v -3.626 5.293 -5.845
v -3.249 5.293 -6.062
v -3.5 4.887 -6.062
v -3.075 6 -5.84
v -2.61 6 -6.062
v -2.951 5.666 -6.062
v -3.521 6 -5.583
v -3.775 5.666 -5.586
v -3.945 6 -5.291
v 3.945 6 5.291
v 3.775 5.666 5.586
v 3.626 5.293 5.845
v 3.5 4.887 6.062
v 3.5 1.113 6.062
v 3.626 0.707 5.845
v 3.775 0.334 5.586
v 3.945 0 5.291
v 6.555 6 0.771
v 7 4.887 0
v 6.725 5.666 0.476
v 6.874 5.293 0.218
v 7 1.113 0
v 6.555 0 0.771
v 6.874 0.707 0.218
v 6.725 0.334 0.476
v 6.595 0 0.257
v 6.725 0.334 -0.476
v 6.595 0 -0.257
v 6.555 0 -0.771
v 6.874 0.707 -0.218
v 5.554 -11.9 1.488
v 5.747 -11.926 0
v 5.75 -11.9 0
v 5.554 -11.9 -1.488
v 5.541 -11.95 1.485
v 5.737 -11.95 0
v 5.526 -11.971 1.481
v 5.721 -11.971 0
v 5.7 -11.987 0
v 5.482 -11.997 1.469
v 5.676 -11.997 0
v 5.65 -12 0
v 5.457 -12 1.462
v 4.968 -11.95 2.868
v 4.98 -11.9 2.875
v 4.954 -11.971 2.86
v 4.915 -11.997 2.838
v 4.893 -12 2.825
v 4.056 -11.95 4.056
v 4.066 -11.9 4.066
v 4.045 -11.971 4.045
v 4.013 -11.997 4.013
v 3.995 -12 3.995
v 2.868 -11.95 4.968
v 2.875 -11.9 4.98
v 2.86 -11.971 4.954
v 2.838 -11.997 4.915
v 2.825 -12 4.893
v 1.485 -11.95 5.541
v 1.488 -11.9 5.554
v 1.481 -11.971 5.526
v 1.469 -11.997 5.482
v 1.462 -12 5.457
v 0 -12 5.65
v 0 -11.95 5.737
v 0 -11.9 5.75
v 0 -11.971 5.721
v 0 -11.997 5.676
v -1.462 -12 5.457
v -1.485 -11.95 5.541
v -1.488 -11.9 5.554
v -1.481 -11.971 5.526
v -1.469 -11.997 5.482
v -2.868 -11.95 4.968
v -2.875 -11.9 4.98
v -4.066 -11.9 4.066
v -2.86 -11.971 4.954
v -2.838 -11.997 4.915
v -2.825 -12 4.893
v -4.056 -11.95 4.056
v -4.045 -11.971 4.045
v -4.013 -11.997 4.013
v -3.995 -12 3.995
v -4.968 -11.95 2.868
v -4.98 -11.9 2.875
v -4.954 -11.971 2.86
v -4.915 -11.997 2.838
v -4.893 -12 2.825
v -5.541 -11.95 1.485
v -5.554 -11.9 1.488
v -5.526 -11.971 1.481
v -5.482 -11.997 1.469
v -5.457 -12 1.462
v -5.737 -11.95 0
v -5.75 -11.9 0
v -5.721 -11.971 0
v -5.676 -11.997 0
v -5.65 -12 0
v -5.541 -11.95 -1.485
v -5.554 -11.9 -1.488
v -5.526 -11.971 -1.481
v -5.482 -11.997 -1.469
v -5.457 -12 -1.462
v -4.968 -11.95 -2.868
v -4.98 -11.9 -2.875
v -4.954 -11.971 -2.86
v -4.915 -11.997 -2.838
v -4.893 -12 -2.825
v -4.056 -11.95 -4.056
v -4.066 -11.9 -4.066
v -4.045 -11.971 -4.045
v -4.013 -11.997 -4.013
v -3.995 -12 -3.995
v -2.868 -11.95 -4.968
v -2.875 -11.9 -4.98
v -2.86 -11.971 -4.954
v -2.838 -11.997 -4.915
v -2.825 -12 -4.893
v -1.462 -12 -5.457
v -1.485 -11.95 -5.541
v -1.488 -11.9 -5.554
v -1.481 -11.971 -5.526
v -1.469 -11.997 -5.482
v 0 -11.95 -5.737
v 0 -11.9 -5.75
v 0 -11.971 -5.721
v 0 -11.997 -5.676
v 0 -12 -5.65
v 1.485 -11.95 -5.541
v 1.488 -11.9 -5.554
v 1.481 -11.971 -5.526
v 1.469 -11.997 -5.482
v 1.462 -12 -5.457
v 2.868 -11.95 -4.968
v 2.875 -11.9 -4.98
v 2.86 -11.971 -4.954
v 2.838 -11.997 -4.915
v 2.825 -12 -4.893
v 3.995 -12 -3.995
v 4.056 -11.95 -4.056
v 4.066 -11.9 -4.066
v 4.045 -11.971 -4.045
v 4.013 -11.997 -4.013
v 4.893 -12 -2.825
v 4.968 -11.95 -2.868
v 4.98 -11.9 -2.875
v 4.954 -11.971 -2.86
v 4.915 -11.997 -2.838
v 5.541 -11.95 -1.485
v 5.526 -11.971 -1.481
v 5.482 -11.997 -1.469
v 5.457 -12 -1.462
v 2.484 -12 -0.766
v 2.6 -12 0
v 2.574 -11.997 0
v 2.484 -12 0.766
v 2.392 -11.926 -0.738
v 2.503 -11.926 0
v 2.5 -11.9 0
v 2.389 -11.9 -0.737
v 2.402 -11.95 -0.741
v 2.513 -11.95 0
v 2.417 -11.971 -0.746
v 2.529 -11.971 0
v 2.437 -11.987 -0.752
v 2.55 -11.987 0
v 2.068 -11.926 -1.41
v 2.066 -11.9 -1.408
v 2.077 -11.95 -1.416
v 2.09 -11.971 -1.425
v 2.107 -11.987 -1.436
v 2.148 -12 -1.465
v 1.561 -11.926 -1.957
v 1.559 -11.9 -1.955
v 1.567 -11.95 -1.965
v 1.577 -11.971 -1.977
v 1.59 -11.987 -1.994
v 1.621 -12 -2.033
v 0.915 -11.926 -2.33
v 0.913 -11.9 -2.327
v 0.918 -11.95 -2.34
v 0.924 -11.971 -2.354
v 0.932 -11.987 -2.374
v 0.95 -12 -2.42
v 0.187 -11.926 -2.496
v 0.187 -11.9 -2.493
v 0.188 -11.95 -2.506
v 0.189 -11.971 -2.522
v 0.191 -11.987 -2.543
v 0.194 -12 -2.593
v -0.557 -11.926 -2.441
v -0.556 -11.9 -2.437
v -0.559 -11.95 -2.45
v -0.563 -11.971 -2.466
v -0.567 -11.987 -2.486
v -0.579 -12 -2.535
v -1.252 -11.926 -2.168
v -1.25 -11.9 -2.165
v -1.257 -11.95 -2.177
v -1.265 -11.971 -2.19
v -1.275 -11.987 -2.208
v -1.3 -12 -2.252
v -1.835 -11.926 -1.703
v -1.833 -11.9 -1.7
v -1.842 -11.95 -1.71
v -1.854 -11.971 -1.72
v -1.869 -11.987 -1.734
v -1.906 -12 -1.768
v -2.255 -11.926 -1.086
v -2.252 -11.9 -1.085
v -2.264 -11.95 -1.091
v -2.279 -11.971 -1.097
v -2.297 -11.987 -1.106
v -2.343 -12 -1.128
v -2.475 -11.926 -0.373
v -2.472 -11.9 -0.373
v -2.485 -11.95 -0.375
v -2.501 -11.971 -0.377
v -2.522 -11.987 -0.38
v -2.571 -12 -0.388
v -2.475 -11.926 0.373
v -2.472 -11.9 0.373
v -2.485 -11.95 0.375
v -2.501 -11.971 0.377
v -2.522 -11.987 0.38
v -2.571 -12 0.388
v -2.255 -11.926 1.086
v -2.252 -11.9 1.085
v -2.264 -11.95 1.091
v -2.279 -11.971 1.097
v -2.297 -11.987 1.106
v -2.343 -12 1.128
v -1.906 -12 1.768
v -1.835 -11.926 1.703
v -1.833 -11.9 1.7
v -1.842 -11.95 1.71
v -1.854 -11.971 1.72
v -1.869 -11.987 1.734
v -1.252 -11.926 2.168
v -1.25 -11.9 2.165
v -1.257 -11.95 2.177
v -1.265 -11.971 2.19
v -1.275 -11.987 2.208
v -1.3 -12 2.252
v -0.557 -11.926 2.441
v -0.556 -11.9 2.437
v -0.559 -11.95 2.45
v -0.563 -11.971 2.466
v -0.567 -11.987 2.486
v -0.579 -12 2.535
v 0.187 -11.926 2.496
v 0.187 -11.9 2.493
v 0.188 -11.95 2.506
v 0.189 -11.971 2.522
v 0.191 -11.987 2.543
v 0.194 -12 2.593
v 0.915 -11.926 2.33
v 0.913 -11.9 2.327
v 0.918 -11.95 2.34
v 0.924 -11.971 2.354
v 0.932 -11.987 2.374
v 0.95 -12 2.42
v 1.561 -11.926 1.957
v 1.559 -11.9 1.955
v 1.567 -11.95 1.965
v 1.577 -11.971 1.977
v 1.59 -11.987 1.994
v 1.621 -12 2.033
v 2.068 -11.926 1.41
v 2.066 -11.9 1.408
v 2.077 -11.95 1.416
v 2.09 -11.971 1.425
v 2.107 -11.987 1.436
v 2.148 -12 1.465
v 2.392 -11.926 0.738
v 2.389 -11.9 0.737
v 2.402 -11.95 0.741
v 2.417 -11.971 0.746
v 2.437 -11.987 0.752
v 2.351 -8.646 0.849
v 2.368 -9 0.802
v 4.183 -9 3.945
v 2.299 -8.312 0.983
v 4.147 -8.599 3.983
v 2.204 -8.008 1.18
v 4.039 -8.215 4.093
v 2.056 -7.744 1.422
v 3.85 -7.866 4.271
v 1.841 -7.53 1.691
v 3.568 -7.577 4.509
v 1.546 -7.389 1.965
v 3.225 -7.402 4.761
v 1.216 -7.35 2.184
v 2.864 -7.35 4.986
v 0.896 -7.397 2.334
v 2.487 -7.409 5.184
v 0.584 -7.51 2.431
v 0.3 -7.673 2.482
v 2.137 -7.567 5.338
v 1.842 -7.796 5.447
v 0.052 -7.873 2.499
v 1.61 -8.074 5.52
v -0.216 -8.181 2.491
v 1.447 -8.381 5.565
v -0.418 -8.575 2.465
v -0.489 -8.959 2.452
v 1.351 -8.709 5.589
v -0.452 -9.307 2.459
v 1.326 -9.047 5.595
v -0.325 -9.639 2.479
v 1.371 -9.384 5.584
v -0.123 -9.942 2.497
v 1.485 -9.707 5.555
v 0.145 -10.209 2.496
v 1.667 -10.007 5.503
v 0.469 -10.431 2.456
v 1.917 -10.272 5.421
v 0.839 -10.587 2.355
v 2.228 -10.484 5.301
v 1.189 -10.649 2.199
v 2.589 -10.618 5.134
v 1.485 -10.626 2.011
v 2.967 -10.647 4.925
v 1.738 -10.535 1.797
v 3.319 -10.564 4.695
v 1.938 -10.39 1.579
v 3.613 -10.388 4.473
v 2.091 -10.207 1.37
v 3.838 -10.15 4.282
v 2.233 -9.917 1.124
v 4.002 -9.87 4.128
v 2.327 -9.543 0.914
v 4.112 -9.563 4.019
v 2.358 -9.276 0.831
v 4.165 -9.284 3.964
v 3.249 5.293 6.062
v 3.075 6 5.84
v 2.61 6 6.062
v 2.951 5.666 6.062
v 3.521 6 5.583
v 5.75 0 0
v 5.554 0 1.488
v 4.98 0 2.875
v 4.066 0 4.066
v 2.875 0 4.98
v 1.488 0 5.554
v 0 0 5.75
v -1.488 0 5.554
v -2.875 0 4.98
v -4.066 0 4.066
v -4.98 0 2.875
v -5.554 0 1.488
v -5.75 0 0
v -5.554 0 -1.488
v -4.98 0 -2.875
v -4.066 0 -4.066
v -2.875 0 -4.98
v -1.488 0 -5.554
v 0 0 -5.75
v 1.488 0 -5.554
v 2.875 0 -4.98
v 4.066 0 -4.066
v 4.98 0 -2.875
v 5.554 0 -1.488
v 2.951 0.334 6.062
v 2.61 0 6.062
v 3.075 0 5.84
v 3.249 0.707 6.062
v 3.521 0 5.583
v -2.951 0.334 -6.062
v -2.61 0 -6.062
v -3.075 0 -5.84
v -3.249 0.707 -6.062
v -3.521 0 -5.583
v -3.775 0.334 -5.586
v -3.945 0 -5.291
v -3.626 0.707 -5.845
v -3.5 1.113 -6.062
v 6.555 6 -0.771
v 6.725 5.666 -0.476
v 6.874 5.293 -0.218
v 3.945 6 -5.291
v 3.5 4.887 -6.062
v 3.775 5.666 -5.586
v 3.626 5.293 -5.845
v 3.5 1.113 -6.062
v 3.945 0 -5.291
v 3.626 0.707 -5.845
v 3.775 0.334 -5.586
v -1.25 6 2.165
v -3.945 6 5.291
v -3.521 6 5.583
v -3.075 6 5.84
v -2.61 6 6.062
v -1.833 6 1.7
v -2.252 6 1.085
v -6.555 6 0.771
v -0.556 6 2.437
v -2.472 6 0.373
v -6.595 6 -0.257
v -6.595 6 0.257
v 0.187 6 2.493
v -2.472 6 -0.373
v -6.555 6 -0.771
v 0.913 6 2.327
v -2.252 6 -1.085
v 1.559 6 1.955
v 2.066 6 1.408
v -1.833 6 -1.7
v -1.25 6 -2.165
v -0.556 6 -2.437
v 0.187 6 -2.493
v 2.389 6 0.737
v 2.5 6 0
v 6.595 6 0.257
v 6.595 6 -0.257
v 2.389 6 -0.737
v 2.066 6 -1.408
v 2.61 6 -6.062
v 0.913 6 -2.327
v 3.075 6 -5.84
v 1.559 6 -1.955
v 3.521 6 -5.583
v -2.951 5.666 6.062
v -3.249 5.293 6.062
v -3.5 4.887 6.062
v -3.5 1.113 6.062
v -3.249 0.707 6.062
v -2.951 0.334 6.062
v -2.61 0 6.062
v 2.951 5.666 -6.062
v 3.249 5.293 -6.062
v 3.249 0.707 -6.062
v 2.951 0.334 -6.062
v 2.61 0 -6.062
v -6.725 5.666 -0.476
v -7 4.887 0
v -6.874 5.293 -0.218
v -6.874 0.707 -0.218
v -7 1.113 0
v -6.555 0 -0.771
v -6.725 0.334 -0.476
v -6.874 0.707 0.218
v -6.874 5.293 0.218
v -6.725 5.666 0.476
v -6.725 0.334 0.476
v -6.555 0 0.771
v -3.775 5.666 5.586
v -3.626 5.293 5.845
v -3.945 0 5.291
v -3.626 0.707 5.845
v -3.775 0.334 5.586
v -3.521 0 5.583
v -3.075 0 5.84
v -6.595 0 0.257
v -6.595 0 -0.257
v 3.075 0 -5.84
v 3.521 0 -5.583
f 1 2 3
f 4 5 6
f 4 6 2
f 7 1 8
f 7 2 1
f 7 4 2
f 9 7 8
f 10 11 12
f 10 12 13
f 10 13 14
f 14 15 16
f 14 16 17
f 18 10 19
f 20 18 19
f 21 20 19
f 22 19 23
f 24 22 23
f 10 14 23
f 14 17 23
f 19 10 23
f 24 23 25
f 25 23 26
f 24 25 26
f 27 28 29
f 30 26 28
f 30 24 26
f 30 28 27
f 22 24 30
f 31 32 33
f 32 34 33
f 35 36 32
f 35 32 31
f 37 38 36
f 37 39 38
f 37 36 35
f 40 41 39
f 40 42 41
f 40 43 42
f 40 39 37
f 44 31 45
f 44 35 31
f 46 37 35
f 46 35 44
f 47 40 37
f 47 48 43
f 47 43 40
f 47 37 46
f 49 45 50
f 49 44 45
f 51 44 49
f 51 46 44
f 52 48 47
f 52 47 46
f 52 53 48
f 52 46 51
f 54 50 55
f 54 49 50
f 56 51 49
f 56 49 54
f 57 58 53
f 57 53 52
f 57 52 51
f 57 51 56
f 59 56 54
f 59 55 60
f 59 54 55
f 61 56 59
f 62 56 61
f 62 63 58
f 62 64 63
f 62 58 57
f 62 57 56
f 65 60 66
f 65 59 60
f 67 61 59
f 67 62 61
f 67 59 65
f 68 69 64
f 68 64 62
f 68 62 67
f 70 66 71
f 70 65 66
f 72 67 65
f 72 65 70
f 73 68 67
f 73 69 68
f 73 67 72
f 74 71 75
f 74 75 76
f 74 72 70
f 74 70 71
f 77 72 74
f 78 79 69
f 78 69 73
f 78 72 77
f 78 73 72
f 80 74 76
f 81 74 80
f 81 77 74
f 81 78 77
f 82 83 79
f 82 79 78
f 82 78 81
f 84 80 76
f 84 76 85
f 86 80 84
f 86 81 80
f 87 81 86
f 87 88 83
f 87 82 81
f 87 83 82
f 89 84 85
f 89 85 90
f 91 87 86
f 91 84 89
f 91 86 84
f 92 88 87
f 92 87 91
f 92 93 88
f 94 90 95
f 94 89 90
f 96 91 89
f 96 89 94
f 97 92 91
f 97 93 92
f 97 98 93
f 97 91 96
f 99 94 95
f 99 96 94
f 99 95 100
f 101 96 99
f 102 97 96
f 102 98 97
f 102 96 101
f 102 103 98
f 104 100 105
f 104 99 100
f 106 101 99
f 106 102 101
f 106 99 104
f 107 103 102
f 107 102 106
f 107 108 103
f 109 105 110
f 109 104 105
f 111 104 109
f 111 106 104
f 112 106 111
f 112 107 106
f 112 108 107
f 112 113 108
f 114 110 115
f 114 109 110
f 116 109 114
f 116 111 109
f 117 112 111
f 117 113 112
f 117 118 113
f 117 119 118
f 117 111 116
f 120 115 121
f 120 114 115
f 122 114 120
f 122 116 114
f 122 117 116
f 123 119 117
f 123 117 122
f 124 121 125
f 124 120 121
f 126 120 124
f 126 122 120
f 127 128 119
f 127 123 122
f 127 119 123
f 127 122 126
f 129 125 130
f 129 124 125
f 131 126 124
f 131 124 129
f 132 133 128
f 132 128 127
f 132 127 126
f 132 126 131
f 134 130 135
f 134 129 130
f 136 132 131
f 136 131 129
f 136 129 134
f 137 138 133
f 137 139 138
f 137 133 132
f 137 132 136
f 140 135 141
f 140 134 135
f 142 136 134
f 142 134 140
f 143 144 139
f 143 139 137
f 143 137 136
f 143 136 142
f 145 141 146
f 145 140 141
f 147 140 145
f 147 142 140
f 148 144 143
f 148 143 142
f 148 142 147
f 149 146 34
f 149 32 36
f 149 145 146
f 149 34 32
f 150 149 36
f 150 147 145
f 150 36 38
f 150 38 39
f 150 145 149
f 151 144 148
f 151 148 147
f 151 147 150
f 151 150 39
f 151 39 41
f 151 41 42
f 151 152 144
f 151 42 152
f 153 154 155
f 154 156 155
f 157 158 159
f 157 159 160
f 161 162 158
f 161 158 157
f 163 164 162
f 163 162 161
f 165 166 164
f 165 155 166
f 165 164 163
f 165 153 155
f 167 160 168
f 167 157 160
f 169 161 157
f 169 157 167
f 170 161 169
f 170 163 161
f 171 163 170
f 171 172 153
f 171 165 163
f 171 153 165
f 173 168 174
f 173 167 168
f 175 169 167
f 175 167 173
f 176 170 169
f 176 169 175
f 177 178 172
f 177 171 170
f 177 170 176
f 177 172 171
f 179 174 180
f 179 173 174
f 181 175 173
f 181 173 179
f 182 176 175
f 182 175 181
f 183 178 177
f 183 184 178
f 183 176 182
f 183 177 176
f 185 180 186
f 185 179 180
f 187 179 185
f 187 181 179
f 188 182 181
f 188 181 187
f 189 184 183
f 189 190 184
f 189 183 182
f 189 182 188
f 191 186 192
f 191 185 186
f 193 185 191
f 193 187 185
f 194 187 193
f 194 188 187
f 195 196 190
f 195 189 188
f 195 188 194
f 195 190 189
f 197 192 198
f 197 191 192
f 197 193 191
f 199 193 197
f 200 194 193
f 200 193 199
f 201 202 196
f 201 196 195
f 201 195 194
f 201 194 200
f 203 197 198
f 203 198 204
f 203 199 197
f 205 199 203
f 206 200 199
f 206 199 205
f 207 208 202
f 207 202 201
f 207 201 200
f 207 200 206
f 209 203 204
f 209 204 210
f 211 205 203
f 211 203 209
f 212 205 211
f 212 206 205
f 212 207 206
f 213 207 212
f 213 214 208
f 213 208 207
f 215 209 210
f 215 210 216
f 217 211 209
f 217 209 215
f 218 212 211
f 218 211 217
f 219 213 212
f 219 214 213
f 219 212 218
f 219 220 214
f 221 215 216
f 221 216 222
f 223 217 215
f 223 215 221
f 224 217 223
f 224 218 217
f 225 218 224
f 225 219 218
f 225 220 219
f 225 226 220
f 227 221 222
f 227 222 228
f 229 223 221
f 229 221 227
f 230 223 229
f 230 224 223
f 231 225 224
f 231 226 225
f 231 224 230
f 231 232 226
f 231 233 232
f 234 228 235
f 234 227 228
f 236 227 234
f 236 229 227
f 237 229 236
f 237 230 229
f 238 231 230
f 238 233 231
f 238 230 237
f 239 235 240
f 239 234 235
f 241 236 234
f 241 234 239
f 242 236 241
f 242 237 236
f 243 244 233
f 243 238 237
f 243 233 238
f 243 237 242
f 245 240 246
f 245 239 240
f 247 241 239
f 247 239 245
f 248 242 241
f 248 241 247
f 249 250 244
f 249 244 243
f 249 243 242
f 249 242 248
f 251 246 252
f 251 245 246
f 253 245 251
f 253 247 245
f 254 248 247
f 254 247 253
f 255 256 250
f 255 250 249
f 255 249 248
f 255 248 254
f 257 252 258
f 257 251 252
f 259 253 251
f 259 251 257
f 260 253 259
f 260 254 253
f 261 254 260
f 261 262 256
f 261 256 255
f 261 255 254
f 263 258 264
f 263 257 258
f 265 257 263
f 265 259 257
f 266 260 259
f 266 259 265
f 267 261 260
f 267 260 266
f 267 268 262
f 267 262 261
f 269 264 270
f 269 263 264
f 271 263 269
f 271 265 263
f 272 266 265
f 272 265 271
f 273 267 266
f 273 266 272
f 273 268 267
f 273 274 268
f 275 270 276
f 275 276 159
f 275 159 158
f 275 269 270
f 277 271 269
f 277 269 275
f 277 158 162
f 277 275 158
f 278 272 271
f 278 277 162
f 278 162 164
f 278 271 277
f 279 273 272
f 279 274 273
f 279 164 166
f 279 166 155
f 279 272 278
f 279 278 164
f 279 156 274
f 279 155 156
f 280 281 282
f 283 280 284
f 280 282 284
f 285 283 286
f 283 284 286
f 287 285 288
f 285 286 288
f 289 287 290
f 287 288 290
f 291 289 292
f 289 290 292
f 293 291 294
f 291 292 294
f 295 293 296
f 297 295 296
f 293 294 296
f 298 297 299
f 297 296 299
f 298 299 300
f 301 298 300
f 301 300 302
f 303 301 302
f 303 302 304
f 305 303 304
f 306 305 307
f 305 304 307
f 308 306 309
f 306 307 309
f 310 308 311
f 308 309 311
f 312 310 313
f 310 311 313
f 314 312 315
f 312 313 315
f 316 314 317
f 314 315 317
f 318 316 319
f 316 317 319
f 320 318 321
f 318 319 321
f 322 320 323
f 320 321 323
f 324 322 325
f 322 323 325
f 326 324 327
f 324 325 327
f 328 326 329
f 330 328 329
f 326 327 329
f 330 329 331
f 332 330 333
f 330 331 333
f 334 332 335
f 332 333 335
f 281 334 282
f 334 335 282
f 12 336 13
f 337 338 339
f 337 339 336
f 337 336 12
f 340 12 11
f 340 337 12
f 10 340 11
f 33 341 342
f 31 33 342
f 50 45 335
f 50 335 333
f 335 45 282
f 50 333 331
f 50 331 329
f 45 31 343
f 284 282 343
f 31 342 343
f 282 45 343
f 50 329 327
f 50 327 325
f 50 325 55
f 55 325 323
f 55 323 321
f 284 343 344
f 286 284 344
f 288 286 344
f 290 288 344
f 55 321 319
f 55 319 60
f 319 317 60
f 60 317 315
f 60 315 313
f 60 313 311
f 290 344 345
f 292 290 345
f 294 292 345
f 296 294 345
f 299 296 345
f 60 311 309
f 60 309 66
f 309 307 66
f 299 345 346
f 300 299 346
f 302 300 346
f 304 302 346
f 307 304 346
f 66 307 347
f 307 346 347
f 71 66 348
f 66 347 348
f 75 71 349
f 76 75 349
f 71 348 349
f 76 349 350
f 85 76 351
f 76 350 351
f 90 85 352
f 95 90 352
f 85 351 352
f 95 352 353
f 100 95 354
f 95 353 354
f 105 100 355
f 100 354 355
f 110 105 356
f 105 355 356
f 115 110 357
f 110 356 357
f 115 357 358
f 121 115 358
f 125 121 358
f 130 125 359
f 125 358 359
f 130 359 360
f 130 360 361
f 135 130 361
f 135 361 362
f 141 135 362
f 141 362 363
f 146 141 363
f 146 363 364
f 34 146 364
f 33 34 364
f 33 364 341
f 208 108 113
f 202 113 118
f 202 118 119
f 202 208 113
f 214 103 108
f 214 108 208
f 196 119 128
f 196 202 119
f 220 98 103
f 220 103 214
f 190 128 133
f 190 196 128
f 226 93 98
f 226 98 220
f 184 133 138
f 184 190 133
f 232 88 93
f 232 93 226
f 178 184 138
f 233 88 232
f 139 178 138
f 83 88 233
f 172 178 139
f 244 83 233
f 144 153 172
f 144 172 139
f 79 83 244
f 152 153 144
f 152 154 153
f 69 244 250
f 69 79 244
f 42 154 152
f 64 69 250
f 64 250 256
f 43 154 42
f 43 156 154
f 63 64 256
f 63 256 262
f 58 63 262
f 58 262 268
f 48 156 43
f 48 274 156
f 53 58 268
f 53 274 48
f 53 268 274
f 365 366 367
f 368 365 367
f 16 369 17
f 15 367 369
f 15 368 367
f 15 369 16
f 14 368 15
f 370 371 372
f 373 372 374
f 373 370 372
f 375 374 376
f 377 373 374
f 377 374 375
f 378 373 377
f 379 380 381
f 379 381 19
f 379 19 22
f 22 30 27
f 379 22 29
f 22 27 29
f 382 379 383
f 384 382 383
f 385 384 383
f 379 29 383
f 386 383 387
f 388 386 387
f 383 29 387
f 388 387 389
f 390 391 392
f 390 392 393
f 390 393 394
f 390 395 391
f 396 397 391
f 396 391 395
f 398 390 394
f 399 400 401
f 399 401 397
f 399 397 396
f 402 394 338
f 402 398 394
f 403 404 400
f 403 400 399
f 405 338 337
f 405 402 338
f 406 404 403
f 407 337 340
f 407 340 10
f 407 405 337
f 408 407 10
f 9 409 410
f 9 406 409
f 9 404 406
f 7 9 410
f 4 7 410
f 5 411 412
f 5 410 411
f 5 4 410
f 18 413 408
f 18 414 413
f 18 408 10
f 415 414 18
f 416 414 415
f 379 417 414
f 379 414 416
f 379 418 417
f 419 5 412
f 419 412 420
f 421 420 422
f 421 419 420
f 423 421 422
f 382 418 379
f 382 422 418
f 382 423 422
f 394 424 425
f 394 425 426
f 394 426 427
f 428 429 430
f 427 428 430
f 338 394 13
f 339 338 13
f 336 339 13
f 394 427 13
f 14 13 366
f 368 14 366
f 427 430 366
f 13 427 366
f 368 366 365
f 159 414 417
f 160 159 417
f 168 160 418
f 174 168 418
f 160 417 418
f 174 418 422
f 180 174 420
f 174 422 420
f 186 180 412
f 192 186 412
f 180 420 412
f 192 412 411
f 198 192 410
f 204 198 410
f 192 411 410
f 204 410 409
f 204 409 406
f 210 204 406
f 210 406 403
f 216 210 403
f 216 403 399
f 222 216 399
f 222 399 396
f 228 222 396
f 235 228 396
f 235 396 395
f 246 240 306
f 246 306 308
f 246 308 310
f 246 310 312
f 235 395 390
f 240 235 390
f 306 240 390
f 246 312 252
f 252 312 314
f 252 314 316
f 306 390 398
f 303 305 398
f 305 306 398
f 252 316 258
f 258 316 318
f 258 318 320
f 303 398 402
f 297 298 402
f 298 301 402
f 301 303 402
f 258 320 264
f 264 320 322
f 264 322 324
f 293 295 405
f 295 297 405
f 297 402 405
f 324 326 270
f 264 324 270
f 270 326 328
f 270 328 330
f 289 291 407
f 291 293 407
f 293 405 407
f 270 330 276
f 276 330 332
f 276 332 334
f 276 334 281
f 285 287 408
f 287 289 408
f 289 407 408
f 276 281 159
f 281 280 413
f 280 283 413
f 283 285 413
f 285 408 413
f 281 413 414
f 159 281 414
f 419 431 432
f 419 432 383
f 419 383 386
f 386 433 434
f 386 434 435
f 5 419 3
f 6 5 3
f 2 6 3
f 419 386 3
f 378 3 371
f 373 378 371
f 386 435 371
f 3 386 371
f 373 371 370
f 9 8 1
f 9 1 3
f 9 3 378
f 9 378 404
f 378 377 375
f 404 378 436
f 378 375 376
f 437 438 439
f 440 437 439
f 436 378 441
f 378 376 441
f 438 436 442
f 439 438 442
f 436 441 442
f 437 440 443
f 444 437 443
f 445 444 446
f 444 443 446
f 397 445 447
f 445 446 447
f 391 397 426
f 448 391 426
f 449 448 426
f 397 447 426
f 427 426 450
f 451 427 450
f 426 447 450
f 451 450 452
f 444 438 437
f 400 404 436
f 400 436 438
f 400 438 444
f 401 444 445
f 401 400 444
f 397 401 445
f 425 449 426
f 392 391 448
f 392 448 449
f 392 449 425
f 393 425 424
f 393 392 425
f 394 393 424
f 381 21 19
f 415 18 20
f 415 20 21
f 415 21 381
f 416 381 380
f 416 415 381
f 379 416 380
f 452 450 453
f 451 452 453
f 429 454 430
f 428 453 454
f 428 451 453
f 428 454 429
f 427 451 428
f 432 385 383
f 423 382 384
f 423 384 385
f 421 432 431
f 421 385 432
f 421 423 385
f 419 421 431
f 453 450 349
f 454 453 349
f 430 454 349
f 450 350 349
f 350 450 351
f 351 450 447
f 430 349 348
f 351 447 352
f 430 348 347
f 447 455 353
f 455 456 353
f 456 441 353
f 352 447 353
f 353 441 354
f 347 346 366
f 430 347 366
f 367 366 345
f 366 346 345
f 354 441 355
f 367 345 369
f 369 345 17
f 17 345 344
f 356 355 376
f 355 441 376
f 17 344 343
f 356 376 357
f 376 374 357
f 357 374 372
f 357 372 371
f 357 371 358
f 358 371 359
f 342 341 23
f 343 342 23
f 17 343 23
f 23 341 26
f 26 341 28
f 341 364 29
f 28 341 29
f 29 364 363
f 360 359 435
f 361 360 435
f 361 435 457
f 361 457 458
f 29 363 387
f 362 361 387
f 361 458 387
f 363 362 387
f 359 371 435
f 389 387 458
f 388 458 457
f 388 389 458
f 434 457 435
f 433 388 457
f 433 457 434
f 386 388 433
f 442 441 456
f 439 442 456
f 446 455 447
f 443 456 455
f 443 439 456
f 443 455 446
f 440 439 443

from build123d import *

# Parameters (mm, degrees)
EXTRUDE_1_DEPTH     = 6
SKETCH_2_R          = 5.75
EXTRUDE_2_DEPTH     = 12
SKETCH_3_R          = 2.5
CUT_EXTRUDE_1_DEPTH = 29
SKETCH_5_R          = 1.65
CUT_EXTRUDE_2_DEPTH = 3.5
FILLET_2_R          = 0.1


with BuildPart() as part:
    # 草图1 → 凸台-拉伸1 (new body)
    with BuildSketch(Plane(origin=(0, 0, 0), x_dir=(1, 0, 0), z_dir=(0, 1, 0))):
        Polygon((-3.5, -6.062177826), (3.5, -6.062177826), (7, 0), (3.5, 6.062177826), (-3.5, 6.062177826), (-7, 0), align=None)
    extrude(amount=EXTRUDE_1_DEPTH)

    # 草图2 → 凸台-拉伸2 (add)
    with BuildSketch(Plane.XZ):
        Circle(SKETCH_2_R)
    extrude(amount=EXTRUDE_2_DEPTH)

    # 草图3 → 切除-拉伸1 (cut)
    with BuildSketch(Plane(origin=(0, 6, 0), x_dir=(1, 0, 0), z_dir=(0, 1, 0))):
        Circle(SKETCH_3_R)
    extrude(amount=-CUT_EXTRUDE_1_DEPTH, mode=Mode.SUBTRACT)

    # 草图4 → 切除-旋转1 (revolve, cut)
    with BuildSketch(Plane.XY):
        with BuildLine():
            Line((-7, 0), (-6.600189391, 0))
            ThreePointArc((-6.600189391, 0), (-6.822809169, 0.548107865), (-7, 1.112541391))
            Line((-7, 1.112541391), (-7, 0))
        make_face()
        with BuildLine():
            Line((-7, 6), (-7, 4.887458609))
            ThreePointArc((-7, 4.887458609), (-6.822809169, 5.451892135), (-6.600189391, 6))
            Line((-6.600189391, 6), (-7, 6))
        make_face()
    revolve(axis=Axis((0, -23, 0), (0, 1, 0)), mode=Mode.SUBTRACT)

    # 草图5 → 切除-拉伸2 (cut, symmetric)
    with BuildSketch(Plane(origin=(1.75, 0, 3.031088913), x_dir=(0.866025404, 0, -0.5), z_dir=(0.5, 0, 0.866025404))):
        with Locations((0, -9)):
            Circle(SKETCH_5_R)
    extrude(amount=CUT_EXTRUDE_2_DEPTH, both=True, mode=Mode.SUBTRACT)

    # 圆角2
    fillet_2_edges = [part.edges().sort_by_distance(p)[0] for p in [
        (-5.75, -12, 0),
        (-2.5, -12, 0),
    ]]
    fillet(fillet_2_edges, radius=FILLET_2_R)


solid = part.part
